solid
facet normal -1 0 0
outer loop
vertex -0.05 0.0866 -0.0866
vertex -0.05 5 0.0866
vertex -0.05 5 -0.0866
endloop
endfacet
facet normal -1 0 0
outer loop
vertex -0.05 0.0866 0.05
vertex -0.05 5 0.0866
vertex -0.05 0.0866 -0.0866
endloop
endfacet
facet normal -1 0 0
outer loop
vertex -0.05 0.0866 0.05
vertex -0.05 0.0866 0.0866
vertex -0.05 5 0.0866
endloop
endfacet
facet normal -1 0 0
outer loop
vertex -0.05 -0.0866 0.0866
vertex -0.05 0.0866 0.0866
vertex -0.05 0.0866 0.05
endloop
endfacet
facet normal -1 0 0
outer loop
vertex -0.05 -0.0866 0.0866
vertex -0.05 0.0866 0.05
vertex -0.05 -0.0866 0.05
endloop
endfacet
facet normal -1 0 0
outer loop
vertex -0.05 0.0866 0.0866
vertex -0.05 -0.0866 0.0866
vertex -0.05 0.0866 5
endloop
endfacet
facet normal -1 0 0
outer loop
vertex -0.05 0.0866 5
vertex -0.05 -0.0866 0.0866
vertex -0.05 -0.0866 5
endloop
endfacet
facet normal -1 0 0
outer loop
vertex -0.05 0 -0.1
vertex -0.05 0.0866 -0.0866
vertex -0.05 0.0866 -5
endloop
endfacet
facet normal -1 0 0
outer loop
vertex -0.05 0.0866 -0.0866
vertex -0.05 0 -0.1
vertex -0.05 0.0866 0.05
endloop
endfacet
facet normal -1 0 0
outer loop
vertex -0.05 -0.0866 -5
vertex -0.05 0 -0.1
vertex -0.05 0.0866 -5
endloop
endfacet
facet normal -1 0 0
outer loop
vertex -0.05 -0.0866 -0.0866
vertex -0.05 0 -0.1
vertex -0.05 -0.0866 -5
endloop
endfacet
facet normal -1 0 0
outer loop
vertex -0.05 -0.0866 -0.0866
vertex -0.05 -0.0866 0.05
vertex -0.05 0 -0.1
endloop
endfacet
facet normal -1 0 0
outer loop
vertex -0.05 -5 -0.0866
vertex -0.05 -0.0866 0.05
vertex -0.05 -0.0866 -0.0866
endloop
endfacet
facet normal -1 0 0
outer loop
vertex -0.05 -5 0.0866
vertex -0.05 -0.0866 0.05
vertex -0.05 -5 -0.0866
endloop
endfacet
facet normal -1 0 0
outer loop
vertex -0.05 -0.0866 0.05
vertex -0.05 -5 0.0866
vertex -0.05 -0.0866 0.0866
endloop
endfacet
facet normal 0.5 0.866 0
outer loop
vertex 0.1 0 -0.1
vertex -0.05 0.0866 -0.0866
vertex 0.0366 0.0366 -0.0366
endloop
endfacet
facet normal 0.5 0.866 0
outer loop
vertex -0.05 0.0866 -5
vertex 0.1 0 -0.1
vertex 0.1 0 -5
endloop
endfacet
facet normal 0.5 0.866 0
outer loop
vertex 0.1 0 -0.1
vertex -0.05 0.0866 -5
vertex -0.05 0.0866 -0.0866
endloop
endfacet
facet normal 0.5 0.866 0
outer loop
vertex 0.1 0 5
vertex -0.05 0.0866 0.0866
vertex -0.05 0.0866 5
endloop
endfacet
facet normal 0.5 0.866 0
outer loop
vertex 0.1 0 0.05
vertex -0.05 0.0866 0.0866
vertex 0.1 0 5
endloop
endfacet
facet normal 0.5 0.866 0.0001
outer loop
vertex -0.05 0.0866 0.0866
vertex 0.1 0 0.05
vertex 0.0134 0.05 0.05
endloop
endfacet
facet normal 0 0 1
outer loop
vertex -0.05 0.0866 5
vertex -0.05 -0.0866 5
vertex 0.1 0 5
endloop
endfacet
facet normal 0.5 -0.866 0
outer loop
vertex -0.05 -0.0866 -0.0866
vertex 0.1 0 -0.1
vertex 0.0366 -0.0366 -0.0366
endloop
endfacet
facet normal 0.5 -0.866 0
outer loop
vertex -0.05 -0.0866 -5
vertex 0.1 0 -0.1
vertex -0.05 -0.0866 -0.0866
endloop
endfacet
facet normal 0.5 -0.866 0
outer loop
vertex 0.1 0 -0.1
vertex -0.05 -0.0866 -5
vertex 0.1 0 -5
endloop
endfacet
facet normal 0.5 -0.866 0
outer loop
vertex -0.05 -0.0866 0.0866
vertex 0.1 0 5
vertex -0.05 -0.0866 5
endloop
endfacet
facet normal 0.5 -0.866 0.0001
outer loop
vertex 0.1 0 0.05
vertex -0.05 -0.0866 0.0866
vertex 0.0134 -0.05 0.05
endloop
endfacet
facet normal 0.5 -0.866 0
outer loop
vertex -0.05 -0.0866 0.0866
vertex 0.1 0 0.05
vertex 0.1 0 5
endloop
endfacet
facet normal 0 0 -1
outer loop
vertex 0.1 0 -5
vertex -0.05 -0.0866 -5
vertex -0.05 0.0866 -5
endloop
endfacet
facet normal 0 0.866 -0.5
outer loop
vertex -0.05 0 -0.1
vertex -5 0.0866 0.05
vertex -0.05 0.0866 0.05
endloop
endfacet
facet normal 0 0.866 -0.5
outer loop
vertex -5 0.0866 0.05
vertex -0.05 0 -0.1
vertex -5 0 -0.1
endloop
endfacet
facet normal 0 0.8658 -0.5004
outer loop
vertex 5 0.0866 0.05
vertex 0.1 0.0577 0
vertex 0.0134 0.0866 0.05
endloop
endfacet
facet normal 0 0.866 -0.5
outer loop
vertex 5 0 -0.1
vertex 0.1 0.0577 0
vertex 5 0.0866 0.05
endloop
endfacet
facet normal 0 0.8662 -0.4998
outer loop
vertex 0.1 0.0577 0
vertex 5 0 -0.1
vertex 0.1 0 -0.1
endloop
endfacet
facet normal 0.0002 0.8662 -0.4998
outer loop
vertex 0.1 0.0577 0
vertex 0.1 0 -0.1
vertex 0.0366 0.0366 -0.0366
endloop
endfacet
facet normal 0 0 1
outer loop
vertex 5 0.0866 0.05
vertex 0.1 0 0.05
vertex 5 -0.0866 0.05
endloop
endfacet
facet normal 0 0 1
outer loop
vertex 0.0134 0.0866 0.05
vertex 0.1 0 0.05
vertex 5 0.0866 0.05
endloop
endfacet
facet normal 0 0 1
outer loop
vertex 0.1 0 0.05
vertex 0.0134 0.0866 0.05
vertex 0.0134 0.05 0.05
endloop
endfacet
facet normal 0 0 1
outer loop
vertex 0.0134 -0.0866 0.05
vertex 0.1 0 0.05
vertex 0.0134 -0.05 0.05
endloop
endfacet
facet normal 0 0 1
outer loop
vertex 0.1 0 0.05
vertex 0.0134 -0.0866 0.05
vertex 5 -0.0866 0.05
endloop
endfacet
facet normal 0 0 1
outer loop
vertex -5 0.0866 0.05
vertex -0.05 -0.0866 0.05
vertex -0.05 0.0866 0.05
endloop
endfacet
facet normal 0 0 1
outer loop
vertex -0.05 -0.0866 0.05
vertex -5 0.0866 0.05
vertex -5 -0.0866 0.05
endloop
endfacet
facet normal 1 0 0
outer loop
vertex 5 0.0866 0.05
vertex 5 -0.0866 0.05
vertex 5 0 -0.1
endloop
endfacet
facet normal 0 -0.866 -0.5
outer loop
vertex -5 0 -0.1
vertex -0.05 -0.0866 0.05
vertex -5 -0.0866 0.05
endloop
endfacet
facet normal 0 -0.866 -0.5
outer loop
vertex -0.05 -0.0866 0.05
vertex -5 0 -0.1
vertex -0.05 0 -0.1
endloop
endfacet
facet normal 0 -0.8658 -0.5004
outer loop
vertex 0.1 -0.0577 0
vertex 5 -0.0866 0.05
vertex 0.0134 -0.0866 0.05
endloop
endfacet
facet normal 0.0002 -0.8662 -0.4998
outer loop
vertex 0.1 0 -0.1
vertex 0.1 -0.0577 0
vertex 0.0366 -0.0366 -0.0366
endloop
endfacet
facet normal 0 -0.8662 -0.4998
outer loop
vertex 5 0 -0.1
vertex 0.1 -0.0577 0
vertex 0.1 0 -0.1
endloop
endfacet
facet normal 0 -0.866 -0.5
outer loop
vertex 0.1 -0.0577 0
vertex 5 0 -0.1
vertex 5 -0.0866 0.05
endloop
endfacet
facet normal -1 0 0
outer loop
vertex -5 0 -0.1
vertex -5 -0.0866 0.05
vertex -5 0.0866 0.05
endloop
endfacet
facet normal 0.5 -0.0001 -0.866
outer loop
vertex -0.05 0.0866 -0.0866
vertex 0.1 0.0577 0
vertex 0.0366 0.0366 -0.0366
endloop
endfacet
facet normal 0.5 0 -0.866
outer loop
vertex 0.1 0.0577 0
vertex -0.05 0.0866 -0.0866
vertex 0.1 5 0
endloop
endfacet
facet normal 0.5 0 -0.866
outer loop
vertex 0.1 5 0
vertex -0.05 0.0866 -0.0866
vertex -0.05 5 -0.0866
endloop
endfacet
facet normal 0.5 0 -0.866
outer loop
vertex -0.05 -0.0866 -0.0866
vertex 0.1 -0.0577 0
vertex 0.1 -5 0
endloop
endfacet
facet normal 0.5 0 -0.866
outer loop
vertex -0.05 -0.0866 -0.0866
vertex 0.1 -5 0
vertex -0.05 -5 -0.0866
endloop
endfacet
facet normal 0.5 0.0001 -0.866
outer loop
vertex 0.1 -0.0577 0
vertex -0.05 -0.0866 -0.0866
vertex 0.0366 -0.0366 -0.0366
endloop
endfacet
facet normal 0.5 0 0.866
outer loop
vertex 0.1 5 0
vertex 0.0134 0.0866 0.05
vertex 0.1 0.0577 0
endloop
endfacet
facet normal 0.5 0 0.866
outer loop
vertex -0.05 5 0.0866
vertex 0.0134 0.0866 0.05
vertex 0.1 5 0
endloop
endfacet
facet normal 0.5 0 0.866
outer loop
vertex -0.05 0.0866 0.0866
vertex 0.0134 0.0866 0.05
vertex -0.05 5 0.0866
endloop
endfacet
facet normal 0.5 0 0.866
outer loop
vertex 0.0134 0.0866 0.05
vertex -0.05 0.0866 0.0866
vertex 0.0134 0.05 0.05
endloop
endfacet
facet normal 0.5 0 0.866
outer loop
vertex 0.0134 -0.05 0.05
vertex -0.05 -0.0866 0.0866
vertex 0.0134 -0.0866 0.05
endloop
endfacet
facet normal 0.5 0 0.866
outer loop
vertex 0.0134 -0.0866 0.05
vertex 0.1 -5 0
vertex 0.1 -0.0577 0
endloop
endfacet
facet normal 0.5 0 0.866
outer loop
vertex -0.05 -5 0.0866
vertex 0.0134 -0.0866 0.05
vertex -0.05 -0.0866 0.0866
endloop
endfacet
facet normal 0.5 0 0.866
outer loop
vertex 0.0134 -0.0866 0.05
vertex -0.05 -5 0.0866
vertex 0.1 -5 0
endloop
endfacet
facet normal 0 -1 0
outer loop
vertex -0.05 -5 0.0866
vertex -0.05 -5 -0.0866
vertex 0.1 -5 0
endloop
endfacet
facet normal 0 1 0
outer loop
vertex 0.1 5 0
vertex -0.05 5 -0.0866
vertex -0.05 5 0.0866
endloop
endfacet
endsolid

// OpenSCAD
module torpedo()
{
	union() {
		cylinder(h = 10, r1 = 0.1, r2 = 0.1, center = true);
		rotate(a = 90, v = [0, 1, 0])
			cylinder(h = 10, r1 = 0.1, r2 = 0.1, center = true);
		rotate(a = 90, v = [1, 0, 0])
			cylinder(h = 10, r1 = 0.1, r2 = 0.1, center = true);
	}
}

$fn = 3;
torpedo();
